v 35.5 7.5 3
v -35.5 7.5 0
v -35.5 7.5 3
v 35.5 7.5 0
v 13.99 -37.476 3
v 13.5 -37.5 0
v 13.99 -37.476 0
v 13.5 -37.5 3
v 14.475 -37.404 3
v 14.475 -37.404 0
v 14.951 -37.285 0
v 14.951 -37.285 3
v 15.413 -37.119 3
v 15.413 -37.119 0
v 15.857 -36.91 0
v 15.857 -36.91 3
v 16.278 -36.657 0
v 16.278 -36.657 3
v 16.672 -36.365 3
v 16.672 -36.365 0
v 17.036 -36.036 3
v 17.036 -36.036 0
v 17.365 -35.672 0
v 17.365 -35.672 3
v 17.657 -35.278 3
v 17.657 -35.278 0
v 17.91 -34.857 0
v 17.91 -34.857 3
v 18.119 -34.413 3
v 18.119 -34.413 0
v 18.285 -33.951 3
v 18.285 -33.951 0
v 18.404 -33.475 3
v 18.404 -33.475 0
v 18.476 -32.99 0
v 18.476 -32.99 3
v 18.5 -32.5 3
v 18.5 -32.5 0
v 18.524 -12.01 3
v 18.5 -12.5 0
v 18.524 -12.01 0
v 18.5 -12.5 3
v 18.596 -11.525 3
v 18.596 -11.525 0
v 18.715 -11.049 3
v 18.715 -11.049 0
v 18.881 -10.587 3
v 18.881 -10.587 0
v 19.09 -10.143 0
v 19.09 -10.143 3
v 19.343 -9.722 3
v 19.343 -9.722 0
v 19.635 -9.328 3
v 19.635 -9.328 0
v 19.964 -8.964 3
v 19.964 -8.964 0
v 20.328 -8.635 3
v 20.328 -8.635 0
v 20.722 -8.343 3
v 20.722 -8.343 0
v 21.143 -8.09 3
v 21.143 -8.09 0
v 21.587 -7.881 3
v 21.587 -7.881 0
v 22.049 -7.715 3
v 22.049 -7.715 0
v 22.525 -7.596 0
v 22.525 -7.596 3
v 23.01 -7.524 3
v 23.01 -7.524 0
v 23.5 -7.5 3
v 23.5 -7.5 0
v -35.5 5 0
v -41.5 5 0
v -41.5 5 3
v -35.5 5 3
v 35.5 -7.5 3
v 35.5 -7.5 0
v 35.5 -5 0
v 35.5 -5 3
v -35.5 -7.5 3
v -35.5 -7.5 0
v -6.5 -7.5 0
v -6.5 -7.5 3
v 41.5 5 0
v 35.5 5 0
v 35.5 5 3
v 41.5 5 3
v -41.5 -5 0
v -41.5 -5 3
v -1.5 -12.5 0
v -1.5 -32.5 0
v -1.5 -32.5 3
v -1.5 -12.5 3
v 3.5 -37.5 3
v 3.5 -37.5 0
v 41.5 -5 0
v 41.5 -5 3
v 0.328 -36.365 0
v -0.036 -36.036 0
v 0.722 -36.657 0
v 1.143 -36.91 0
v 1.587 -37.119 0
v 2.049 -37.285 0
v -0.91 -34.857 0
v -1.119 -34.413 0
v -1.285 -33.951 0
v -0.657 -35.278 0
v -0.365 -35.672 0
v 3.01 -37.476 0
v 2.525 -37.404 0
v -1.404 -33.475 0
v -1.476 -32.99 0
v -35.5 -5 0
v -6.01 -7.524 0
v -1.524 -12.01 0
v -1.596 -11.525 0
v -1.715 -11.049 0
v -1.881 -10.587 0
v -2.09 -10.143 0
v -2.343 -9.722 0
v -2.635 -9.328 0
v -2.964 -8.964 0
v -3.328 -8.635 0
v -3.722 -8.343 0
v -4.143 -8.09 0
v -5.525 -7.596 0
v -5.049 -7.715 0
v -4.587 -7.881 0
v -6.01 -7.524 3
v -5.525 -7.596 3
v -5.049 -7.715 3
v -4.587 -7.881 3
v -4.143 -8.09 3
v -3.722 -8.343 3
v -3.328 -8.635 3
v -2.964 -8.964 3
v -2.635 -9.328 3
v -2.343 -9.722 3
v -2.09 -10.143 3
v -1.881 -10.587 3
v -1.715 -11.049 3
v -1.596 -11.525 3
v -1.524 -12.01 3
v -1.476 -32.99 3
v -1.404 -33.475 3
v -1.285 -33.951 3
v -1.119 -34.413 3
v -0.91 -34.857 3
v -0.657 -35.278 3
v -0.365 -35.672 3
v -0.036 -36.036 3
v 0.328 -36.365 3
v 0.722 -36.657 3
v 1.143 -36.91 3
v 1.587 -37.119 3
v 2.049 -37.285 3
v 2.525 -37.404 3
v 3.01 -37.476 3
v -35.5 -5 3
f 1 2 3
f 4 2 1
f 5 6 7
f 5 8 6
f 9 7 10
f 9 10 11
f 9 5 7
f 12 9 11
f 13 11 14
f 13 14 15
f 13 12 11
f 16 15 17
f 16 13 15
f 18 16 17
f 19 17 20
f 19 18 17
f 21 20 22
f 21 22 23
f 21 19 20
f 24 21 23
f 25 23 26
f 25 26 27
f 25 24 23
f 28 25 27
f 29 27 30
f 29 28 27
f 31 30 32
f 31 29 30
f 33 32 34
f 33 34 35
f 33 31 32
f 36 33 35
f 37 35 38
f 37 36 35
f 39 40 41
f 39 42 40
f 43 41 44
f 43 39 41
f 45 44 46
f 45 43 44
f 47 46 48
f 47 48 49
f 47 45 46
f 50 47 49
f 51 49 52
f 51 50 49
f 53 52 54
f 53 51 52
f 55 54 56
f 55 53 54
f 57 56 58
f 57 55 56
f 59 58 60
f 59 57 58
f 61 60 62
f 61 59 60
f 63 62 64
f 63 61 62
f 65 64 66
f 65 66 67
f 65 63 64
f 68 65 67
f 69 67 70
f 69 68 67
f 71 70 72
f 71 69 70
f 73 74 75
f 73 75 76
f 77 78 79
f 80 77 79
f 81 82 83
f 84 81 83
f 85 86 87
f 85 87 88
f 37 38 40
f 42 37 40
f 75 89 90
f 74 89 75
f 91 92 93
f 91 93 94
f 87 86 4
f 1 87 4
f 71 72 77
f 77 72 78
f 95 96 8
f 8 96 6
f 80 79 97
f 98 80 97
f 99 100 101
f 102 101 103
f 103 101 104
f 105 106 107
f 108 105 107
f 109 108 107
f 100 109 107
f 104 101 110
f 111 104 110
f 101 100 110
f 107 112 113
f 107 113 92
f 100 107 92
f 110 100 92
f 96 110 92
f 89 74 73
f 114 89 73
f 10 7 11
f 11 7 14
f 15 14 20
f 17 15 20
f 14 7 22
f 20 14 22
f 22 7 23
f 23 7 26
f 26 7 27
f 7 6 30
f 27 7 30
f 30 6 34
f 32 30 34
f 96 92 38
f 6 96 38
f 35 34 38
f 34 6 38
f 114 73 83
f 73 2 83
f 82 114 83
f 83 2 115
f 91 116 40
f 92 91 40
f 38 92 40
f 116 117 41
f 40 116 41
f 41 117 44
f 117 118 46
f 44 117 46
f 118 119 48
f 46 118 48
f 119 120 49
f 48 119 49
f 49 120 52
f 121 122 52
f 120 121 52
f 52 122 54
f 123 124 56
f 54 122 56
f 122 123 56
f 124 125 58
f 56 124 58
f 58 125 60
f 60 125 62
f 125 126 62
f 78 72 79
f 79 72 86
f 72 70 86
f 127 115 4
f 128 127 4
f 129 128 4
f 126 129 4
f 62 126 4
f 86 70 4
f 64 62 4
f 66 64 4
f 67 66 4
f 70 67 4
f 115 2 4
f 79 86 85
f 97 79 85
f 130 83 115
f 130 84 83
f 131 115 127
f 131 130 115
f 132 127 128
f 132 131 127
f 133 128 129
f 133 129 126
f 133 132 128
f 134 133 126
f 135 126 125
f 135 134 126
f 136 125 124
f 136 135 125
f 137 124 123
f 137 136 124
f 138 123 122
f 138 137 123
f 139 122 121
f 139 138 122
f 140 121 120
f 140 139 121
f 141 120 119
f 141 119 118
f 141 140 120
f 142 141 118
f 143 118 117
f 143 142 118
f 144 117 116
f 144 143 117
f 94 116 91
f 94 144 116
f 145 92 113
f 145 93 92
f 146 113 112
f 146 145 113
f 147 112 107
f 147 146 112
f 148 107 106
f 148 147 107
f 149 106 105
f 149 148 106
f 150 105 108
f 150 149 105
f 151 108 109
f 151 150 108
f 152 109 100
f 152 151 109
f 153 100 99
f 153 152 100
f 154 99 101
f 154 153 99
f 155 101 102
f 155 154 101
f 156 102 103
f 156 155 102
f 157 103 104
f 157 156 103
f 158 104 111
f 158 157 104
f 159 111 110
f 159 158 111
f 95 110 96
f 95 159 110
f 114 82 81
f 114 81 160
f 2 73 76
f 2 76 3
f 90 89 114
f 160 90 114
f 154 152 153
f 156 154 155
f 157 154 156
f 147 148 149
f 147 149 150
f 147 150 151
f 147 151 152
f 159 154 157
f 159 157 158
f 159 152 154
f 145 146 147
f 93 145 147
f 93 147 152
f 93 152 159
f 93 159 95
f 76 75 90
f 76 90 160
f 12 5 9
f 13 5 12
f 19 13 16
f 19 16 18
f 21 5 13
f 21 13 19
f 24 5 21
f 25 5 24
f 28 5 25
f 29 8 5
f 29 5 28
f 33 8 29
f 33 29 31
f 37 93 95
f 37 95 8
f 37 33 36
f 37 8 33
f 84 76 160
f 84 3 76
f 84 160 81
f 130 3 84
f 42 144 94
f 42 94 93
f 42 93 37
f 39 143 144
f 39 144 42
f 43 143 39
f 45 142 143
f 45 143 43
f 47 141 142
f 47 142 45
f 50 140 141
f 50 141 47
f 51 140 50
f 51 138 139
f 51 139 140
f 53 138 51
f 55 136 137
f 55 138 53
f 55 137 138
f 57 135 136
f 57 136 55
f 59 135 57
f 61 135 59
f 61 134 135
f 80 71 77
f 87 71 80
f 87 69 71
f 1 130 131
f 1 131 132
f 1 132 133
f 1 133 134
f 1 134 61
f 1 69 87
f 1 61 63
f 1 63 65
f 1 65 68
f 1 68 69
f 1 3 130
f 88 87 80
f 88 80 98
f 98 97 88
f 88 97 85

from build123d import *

# Parameters (mm, degrees)
ESBO_O1_W                = 71
ESBO_O1_H                = 15
ESBO_O1_W_2              = 20
ESBO_O1_H_2              = 30
ESBO_O1_W_3              = 6
ESBO_O1_H_3              = 10
RESSALTO_EXTRUS_O1_DEPTH = 3
FILETE1_R                = 5


with BuildPart() as part:
    # Esboço1 → Ressalto-extrusão1 (new body)
    with BuildSketch(Plane.XY):
        Rectangle(ESBO_O1_W, ESBO_O1_H)
        with Locations((8.5, -22.5)):
            Rectangle(ESBO_O1_W_2, ESBO_O1_H_2)
        with Locations((38.5, 0)):
            Rectangle(ESBO_O1_W_3, ESBO_O1_H_3)
        with Locations((-38.5, 0)):
            Rectangle(ESBO_O1_W_3, ESBO_O1_H_3)
    extrude(amount=RESSALTO_EXTRUS_O1_DEPTH)

    # Filete1
    filete1_edges = [part.edges().sort_by_distance(p)[0] for p in [
        (18.5, -7.5, 1.5),
        (18.5, -37.5, 1.5),
        (-1.5, -37.5, 1.5),
        (-1.5, -7.5, 1.5),
    ]]
    fillet(filete1_edges, radius=FILETE1_R)


solid = part.part
